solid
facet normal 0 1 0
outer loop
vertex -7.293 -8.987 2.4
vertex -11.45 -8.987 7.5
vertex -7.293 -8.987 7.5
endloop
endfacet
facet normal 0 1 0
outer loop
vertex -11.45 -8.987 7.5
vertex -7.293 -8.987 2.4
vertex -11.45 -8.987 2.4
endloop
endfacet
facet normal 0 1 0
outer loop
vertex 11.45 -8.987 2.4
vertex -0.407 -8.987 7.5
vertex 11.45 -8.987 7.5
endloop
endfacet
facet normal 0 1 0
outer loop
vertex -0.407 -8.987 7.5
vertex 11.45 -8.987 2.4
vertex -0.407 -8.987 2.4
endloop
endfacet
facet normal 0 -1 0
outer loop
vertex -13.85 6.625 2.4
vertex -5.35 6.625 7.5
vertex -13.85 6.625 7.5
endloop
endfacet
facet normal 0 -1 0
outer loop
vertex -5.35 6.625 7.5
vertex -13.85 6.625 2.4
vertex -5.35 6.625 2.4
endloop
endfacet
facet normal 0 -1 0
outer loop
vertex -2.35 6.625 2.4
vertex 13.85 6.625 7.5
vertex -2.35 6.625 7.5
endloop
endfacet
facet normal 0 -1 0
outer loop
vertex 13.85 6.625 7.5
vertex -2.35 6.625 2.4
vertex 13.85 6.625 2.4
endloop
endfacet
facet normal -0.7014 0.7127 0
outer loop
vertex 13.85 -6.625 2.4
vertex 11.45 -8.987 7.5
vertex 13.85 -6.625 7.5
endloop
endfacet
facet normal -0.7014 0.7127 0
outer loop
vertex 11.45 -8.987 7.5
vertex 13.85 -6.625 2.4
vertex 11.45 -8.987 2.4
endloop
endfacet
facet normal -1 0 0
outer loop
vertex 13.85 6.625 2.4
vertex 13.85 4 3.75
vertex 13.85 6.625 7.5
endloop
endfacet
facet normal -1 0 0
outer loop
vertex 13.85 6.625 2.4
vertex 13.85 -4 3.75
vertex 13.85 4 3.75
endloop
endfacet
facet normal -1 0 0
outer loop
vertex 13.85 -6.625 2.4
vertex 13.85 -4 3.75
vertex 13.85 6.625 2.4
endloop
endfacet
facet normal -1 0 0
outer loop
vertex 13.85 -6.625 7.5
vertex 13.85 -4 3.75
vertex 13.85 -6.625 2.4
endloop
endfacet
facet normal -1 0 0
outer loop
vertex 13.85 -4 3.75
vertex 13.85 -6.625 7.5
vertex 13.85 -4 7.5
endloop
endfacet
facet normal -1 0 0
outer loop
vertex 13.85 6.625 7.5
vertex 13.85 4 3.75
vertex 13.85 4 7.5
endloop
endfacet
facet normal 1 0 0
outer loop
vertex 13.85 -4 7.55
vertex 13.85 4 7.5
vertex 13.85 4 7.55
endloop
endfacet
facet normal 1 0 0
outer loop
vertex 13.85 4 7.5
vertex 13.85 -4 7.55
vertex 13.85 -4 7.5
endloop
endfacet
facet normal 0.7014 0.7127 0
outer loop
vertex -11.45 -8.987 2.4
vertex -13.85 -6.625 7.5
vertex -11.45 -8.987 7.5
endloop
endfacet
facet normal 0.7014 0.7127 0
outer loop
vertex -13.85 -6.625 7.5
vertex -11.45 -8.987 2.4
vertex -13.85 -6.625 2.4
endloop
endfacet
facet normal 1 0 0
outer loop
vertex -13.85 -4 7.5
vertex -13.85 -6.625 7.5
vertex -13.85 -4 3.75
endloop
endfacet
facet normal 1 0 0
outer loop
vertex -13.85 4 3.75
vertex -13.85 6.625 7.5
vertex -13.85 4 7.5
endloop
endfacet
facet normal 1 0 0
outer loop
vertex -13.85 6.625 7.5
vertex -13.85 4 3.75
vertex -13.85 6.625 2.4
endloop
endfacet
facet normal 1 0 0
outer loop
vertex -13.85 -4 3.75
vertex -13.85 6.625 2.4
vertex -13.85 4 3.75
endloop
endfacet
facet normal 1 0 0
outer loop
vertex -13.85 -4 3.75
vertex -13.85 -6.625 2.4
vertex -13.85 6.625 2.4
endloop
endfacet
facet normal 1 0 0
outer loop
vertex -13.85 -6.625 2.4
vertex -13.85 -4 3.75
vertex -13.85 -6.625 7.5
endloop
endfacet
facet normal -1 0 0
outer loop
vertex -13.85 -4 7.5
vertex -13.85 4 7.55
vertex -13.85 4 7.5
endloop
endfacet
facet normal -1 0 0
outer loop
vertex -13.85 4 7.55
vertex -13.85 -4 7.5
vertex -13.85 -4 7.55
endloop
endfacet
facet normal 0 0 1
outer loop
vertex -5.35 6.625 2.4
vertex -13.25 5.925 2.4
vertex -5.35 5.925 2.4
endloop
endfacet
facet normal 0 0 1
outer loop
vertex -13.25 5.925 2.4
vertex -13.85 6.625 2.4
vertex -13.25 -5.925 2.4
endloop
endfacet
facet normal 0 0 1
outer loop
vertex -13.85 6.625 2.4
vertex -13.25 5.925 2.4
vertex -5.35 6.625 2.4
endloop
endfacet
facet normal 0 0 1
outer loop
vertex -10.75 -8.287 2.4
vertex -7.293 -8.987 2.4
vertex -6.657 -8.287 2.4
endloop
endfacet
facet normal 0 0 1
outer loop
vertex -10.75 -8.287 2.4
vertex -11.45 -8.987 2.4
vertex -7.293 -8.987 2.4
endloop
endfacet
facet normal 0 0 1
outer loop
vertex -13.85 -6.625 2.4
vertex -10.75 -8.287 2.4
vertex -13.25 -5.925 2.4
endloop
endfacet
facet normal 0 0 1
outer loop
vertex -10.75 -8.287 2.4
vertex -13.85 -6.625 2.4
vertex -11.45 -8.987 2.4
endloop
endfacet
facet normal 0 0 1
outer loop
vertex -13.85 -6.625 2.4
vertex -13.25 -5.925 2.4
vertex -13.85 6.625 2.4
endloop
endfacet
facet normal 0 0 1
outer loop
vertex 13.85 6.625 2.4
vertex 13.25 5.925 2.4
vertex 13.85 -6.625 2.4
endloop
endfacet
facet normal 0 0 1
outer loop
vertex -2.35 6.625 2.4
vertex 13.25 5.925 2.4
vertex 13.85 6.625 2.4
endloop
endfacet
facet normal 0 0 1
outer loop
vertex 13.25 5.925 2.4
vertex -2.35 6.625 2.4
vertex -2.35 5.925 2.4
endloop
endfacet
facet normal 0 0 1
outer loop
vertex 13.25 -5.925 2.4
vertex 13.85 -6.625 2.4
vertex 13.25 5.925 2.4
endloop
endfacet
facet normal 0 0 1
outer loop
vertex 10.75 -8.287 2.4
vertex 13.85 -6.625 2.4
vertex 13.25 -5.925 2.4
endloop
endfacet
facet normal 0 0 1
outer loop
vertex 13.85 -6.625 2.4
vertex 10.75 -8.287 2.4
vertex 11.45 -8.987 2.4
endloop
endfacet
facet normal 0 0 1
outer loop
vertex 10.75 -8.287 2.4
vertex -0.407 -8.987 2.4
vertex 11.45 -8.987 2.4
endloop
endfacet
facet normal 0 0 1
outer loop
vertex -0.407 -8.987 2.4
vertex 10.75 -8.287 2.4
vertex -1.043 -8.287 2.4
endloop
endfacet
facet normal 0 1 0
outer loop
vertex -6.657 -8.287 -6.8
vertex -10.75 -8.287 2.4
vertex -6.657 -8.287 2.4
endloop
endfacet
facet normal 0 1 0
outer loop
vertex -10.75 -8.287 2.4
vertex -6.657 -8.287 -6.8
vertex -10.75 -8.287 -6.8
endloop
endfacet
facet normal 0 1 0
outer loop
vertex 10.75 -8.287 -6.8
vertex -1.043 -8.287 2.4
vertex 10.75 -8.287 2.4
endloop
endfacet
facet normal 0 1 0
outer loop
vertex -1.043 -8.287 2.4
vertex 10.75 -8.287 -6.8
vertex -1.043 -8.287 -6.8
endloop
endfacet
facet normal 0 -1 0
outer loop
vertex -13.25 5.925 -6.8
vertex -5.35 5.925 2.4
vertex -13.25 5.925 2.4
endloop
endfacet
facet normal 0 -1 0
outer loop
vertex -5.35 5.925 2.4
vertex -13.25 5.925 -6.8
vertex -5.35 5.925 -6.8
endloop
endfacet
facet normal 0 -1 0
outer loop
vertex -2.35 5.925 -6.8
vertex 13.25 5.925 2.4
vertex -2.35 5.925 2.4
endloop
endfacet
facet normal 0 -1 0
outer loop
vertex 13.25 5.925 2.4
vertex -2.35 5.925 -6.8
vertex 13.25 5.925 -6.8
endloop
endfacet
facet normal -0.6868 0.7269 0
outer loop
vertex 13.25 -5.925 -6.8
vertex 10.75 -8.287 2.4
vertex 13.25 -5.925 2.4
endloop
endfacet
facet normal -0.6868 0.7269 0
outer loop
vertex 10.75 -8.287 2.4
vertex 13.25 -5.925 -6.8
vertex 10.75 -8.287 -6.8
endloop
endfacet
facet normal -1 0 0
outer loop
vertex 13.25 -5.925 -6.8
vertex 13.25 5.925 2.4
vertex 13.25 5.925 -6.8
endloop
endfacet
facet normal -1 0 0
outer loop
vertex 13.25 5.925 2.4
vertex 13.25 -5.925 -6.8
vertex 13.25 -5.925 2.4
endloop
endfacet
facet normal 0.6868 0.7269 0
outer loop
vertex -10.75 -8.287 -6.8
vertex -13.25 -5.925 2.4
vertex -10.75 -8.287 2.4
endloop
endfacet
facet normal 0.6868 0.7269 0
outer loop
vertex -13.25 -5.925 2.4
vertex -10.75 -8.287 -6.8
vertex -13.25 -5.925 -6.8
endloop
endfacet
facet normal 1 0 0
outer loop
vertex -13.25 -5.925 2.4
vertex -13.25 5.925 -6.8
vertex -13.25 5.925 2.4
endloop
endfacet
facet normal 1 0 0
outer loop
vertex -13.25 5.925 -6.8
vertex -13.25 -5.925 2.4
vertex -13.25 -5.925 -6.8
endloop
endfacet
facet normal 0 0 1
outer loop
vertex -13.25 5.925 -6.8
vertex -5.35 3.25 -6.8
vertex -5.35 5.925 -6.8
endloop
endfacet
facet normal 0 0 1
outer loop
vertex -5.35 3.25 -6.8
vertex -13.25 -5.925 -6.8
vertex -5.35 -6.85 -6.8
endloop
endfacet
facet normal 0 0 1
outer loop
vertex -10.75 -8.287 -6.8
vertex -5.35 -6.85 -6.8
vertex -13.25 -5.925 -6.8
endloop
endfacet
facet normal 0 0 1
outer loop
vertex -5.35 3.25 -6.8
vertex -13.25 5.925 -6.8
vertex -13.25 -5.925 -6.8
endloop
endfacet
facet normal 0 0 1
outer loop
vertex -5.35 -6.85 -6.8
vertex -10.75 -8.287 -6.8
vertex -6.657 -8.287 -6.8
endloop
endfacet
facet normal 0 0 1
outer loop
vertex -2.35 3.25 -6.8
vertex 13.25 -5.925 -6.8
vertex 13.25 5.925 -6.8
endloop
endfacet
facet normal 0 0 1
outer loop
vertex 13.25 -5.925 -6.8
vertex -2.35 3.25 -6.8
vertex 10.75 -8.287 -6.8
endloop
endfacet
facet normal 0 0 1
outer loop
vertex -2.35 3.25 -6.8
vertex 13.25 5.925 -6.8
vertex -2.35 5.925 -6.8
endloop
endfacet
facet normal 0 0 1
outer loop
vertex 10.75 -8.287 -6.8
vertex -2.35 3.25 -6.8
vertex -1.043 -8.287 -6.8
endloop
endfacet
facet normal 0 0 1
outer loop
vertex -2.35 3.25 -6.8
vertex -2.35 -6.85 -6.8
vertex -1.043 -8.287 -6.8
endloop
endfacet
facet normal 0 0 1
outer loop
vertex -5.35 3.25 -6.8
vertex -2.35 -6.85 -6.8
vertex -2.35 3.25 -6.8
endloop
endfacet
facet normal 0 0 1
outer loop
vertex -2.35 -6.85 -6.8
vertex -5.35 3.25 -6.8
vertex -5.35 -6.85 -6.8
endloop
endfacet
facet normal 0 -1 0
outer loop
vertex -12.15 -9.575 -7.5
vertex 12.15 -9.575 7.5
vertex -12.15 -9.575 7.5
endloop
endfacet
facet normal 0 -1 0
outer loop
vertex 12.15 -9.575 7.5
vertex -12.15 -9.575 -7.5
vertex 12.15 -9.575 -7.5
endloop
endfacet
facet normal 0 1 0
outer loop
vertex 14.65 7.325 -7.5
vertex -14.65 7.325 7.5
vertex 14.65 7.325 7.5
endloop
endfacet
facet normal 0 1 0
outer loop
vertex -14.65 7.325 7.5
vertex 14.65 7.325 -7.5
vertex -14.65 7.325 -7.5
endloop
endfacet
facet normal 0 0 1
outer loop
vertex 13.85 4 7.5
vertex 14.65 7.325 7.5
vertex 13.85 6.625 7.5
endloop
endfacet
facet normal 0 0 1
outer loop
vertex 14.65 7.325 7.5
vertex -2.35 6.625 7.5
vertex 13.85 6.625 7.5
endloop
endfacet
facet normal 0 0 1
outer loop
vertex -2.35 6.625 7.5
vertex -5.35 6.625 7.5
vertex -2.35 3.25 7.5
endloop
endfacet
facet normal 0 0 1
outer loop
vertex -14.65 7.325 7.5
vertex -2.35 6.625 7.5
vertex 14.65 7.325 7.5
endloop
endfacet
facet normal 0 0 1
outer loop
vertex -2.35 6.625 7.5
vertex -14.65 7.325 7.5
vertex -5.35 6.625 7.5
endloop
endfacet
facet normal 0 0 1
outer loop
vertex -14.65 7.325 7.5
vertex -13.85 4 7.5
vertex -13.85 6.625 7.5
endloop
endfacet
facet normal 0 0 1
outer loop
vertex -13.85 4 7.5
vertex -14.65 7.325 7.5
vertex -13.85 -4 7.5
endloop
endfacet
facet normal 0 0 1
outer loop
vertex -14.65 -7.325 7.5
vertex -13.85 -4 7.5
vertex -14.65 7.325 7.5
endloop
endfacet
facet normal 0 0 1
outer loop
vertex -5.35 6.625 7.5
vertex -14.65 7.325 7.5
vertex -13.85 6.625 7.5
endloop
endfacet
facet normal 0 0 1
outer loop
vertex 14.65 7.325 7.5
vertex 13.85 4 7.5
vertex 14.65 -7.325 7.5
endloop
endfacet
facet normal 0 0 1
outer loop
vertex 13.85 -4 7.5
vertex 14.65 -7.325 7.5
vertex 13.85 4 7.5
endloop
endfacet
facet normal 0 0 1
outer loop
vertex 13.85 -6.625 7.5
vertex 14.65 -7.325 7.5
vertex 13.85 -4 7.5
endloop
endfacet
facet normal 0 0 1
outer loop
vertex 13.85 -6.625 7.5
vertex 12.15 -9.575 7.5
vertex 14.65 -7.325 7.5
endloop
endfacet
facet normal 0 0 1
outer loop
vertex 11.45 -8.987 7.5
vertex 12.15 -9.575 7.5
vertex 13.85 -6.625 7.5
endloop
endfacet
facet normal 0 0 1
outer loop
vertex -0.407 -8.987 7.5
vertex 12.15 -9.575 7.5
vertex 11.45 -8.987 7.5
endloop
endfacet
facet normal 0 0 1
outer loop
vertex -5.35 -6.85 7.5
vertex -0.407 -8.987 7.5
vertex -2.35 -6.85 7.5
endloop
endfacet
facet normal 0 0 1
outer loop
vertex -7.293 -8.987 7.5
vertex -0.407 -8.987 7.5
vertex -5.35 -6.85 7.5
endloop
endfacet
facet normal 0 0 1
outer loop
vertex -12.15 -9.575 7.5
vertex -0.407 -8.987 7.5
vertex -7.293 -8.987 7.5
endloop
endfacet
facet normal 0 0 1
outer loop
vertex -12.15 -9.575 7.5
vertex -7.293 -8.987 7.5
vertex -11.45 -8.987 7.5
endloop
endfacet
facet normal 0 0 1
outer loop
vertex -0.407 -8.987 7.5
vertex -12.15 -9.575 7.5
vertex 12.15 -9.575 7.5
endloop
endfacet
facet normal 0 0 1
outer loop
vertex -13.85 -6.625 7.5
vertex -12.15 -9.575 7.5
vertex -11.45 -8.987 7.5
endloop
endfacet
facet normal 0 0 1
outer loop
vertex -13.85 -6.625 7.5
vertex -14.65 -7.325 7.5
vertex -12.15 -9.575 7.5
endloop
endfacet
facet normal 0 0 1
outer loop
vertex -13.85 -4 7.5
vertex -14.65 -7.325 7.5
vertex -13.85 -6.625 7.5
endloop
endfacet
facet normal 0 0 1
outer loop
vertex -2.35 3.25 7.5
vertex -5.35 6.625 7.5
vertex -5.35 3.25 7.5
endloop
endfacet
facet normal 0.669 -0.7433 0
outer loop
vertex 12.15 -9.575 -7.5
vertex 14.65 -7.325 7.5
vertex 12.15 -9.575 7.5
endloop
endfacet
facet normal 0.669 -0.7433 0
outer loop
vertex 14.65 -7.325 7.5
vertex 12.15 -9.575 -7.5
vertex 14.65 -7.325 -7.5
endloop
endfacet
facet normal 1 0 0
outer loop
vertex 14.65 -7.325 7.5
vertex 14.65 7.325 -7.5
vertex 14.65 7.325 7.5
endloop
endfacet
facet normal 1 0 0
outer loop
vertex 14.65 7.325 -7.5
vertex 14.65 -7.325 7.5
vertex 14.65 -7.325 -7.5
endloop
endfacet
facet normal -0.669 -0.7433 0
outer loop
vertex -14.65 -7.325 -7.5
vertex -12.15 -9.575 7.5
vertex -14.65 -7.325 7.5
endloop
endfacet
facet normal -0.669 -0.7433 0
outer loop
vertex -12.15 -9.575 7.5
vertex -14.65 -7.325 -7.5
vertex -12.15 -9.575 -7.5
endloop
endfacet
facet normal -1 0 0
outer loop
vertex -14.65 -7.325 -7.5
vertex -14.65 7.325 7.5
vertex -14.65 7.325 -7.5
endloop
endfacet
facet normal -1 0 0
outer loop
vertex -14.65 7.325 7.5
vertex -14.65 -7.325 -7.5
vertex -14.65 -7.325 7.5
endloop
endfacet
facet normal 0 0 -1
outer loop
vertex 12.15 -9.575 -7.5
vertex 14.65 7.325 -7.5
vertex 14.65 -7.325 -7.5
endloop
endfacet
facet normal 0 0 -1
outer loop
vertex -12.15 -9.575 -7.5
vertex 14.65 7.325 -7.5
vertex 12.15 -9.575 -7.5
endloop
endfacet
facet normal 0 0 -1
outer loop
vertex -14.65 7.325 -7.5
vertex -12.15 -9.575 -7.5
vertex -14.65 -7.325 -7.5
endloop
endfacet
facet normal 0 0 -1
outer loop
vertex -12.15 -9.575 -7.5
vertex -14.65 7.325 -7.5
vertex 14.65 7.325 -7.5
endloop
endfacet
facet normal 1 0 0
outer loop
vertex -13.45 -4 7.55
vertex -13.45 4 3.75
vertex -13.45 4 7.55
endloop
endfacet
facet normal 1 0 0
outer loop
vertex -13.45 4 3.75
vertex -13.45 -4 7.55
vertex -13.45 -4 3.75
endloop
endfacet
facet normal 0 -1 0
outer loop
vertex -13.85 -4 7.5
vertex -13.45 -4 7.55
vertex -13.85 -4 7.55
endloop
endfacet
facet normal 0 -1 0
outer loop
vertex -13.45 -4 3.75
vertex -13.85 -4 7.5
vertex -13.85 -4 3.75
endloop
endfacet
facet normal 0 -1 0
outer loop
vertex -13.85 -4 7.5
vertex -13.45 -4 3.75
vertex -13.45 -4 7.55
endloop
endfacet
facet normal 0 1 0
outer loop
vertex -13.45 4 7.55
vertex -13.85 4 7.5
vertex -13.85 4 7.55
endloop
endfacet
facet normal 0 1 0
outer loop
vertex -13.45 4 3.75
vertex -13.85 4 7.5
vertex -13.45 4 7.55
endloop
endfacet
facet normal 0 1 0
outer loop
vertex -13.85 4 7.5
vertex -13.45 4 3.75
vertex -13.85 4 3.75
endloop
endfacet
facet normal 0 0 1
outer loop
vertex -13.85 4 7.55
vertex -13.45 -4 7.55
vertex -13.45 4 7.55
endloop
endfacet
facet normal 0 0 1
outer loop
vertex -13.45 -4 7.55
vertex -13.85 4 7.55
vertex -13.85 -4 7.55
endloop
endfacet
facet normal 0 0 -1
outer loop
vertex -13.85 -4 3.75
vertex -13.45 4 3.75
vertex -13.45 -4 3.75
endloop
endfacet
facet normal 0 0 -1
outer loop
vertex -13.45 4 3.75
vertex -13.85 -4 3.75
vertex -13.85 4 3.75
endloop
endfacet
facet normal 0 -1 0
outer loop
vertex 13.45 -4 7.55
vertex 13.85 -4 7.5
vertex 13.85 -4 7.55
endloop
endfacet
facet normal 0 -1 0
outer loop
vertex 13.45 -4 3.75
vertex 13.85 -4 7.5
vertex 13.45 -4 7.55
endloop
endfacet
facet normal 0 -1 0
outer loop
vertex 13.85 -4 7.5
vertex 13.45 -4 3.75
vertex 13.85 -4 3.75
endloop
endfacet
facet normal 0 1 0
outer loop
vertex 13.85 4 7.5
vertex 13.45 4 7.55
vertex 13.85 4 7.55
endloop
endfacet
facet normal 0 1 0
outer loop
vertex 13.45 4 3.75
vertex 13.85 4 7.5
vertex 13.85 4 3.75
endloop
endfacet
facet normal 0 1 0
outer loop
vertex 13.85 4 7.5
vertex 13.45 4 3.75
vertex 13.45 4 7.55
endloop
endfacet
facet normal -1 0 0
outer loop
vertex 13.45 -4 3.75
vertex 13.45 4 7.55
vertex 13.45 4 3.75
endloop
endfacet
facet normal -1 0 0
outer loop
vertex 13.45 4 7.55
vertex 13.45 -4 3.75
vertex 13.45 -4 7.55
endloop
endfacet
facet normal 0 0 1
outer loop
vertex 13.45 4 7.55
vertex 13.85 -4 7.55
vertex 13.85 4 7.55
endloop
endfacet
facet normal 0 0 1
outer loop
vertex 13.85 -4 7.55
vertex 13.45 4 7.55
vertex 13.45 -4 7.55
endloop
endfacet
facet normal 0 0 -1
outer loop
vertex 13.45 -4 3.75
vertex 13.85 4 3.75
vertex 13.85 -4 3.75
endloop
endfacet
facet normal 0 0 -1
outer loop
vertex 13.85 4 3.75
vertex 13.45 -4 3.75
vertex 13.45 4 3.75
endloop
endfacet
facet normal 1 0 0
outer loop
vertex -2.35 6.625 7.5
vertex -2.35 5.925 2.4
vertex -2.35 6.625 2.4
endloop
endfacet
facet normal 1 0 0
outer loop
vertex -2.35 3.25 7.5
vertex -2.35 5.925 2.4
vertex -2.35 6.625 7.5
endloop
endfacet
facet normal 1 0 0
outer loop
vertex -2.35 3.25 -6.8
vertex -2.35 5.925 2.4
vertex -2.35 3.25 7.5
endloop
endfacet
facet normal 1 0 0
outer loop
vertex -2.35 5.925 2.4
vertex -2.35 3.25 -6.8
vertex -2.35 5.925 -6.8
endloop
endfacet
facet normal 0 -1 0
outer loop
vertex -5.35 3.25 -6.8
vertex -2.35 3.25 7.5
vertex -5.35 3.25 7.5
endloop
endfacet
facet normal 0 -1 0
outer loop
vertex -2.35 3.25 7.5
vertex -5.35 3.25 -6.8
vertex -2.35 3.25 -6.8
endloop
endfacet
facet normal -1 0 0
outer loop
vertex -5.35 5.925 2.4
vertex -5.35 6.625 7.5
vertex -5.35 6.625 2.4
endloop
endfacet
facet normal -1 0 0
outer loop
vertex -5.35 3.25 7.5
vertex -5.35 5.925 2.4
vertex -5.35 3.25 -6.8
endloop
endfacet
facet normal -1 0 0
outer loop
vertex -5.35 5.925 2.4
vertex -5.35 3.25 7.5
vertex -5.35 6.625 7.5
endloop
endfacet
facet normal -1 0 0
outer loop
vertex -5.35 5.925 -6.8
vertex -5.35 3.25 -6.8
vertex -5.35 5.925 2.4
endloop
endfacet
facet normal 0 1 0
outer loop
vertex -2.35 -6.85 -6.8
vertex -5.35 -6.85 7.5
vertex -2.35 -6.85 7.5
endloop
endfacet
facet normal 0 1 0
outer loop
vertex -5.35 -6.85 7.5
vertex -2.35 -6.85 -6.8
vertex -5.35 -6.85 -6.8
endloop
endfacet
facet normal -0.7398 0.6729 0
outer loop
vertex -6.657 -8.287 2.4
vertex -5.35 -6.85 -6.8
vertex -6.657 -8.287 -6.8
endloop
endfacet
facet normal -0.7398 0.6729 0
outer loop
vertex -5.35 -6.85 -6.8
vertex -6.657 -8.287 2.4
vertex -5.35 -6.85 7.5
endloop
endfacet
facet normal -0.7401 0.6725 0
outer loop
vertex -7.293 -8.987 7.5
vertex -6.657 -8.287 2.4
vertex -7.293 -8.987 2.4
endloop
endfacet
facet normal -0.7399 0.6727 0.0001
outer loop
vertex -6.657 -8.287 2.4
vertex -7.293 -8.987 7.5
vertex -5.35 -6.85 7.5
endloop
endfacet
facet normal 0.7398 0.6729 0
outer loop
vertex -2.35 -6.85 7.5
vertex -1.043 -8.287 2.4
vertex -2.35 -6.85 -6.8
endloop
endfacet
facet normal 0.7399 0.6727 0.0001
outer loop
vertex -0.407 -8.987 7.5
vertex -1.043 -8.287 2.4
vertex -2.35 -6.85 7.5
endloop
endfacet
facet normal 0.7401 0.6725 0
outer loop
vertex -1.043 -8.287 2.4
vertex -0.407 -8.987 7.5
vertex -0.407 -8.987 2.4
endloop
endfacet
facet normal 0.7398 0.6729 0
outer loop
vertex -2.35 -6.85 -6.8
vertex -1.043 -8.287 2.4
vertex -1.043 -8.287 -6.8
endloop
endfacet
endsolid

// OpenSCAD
// XT60 dual plug cap for phantom 1.5

thickness=.7;
tol=.5;
it=[-1,1];

rotate([90, 0, 0]) cap();

module cap()
{
	difference()
	{
		cap_plain();
		cap_void();
	}
	translate([-27.9/2+thickness+8+1.4, 0, -5]) cube([3, 15, 3.5], true);
	translate([-27.9/2+thickness+8+1.4, 0, 9.1]) hull()
	{
		cube([7, 15, .1], true);
		translate([0, 0, -2.2]) cube([3, 15, .1], true);
	}
	for(i=it) translate([i*27.9/2-i*.3, 5.65, 0]) cube([.4, 3.8, 8], true);
}

module cap_plain()
{
	hull()
	{
		cube([27.9+thickness*2, 15, 13+tol/2+thickness*2], true);
		translate([0, 0, (13+tol/2)/2+(2+tol/2)/2]) cube([22.9+thickness*2, 15, 2+tol/2+thickness*2], true);
	}
}

module cap_void()
{
	translate([0, 5, 0])hull()
	{
		cube([27.7, 5.2, 13+tol/2], true);
		translate([0, 0, (13+tol/2)/2+(2+.95/2)/2]) cube([22.9, 5.2, 2+tol/2], true);
	}
	translate([0, thickness, 0])hull()
	{
		cube([27.9-thickness*2, 15, 13+tol/2-thickness*2], true);
		translate([0, 0, (13+tol/2)/2+(2+tol/2)/2]) cube([22.9-thickness*2, 15, 2+.95/2-thickness*2], true);
	}
}
